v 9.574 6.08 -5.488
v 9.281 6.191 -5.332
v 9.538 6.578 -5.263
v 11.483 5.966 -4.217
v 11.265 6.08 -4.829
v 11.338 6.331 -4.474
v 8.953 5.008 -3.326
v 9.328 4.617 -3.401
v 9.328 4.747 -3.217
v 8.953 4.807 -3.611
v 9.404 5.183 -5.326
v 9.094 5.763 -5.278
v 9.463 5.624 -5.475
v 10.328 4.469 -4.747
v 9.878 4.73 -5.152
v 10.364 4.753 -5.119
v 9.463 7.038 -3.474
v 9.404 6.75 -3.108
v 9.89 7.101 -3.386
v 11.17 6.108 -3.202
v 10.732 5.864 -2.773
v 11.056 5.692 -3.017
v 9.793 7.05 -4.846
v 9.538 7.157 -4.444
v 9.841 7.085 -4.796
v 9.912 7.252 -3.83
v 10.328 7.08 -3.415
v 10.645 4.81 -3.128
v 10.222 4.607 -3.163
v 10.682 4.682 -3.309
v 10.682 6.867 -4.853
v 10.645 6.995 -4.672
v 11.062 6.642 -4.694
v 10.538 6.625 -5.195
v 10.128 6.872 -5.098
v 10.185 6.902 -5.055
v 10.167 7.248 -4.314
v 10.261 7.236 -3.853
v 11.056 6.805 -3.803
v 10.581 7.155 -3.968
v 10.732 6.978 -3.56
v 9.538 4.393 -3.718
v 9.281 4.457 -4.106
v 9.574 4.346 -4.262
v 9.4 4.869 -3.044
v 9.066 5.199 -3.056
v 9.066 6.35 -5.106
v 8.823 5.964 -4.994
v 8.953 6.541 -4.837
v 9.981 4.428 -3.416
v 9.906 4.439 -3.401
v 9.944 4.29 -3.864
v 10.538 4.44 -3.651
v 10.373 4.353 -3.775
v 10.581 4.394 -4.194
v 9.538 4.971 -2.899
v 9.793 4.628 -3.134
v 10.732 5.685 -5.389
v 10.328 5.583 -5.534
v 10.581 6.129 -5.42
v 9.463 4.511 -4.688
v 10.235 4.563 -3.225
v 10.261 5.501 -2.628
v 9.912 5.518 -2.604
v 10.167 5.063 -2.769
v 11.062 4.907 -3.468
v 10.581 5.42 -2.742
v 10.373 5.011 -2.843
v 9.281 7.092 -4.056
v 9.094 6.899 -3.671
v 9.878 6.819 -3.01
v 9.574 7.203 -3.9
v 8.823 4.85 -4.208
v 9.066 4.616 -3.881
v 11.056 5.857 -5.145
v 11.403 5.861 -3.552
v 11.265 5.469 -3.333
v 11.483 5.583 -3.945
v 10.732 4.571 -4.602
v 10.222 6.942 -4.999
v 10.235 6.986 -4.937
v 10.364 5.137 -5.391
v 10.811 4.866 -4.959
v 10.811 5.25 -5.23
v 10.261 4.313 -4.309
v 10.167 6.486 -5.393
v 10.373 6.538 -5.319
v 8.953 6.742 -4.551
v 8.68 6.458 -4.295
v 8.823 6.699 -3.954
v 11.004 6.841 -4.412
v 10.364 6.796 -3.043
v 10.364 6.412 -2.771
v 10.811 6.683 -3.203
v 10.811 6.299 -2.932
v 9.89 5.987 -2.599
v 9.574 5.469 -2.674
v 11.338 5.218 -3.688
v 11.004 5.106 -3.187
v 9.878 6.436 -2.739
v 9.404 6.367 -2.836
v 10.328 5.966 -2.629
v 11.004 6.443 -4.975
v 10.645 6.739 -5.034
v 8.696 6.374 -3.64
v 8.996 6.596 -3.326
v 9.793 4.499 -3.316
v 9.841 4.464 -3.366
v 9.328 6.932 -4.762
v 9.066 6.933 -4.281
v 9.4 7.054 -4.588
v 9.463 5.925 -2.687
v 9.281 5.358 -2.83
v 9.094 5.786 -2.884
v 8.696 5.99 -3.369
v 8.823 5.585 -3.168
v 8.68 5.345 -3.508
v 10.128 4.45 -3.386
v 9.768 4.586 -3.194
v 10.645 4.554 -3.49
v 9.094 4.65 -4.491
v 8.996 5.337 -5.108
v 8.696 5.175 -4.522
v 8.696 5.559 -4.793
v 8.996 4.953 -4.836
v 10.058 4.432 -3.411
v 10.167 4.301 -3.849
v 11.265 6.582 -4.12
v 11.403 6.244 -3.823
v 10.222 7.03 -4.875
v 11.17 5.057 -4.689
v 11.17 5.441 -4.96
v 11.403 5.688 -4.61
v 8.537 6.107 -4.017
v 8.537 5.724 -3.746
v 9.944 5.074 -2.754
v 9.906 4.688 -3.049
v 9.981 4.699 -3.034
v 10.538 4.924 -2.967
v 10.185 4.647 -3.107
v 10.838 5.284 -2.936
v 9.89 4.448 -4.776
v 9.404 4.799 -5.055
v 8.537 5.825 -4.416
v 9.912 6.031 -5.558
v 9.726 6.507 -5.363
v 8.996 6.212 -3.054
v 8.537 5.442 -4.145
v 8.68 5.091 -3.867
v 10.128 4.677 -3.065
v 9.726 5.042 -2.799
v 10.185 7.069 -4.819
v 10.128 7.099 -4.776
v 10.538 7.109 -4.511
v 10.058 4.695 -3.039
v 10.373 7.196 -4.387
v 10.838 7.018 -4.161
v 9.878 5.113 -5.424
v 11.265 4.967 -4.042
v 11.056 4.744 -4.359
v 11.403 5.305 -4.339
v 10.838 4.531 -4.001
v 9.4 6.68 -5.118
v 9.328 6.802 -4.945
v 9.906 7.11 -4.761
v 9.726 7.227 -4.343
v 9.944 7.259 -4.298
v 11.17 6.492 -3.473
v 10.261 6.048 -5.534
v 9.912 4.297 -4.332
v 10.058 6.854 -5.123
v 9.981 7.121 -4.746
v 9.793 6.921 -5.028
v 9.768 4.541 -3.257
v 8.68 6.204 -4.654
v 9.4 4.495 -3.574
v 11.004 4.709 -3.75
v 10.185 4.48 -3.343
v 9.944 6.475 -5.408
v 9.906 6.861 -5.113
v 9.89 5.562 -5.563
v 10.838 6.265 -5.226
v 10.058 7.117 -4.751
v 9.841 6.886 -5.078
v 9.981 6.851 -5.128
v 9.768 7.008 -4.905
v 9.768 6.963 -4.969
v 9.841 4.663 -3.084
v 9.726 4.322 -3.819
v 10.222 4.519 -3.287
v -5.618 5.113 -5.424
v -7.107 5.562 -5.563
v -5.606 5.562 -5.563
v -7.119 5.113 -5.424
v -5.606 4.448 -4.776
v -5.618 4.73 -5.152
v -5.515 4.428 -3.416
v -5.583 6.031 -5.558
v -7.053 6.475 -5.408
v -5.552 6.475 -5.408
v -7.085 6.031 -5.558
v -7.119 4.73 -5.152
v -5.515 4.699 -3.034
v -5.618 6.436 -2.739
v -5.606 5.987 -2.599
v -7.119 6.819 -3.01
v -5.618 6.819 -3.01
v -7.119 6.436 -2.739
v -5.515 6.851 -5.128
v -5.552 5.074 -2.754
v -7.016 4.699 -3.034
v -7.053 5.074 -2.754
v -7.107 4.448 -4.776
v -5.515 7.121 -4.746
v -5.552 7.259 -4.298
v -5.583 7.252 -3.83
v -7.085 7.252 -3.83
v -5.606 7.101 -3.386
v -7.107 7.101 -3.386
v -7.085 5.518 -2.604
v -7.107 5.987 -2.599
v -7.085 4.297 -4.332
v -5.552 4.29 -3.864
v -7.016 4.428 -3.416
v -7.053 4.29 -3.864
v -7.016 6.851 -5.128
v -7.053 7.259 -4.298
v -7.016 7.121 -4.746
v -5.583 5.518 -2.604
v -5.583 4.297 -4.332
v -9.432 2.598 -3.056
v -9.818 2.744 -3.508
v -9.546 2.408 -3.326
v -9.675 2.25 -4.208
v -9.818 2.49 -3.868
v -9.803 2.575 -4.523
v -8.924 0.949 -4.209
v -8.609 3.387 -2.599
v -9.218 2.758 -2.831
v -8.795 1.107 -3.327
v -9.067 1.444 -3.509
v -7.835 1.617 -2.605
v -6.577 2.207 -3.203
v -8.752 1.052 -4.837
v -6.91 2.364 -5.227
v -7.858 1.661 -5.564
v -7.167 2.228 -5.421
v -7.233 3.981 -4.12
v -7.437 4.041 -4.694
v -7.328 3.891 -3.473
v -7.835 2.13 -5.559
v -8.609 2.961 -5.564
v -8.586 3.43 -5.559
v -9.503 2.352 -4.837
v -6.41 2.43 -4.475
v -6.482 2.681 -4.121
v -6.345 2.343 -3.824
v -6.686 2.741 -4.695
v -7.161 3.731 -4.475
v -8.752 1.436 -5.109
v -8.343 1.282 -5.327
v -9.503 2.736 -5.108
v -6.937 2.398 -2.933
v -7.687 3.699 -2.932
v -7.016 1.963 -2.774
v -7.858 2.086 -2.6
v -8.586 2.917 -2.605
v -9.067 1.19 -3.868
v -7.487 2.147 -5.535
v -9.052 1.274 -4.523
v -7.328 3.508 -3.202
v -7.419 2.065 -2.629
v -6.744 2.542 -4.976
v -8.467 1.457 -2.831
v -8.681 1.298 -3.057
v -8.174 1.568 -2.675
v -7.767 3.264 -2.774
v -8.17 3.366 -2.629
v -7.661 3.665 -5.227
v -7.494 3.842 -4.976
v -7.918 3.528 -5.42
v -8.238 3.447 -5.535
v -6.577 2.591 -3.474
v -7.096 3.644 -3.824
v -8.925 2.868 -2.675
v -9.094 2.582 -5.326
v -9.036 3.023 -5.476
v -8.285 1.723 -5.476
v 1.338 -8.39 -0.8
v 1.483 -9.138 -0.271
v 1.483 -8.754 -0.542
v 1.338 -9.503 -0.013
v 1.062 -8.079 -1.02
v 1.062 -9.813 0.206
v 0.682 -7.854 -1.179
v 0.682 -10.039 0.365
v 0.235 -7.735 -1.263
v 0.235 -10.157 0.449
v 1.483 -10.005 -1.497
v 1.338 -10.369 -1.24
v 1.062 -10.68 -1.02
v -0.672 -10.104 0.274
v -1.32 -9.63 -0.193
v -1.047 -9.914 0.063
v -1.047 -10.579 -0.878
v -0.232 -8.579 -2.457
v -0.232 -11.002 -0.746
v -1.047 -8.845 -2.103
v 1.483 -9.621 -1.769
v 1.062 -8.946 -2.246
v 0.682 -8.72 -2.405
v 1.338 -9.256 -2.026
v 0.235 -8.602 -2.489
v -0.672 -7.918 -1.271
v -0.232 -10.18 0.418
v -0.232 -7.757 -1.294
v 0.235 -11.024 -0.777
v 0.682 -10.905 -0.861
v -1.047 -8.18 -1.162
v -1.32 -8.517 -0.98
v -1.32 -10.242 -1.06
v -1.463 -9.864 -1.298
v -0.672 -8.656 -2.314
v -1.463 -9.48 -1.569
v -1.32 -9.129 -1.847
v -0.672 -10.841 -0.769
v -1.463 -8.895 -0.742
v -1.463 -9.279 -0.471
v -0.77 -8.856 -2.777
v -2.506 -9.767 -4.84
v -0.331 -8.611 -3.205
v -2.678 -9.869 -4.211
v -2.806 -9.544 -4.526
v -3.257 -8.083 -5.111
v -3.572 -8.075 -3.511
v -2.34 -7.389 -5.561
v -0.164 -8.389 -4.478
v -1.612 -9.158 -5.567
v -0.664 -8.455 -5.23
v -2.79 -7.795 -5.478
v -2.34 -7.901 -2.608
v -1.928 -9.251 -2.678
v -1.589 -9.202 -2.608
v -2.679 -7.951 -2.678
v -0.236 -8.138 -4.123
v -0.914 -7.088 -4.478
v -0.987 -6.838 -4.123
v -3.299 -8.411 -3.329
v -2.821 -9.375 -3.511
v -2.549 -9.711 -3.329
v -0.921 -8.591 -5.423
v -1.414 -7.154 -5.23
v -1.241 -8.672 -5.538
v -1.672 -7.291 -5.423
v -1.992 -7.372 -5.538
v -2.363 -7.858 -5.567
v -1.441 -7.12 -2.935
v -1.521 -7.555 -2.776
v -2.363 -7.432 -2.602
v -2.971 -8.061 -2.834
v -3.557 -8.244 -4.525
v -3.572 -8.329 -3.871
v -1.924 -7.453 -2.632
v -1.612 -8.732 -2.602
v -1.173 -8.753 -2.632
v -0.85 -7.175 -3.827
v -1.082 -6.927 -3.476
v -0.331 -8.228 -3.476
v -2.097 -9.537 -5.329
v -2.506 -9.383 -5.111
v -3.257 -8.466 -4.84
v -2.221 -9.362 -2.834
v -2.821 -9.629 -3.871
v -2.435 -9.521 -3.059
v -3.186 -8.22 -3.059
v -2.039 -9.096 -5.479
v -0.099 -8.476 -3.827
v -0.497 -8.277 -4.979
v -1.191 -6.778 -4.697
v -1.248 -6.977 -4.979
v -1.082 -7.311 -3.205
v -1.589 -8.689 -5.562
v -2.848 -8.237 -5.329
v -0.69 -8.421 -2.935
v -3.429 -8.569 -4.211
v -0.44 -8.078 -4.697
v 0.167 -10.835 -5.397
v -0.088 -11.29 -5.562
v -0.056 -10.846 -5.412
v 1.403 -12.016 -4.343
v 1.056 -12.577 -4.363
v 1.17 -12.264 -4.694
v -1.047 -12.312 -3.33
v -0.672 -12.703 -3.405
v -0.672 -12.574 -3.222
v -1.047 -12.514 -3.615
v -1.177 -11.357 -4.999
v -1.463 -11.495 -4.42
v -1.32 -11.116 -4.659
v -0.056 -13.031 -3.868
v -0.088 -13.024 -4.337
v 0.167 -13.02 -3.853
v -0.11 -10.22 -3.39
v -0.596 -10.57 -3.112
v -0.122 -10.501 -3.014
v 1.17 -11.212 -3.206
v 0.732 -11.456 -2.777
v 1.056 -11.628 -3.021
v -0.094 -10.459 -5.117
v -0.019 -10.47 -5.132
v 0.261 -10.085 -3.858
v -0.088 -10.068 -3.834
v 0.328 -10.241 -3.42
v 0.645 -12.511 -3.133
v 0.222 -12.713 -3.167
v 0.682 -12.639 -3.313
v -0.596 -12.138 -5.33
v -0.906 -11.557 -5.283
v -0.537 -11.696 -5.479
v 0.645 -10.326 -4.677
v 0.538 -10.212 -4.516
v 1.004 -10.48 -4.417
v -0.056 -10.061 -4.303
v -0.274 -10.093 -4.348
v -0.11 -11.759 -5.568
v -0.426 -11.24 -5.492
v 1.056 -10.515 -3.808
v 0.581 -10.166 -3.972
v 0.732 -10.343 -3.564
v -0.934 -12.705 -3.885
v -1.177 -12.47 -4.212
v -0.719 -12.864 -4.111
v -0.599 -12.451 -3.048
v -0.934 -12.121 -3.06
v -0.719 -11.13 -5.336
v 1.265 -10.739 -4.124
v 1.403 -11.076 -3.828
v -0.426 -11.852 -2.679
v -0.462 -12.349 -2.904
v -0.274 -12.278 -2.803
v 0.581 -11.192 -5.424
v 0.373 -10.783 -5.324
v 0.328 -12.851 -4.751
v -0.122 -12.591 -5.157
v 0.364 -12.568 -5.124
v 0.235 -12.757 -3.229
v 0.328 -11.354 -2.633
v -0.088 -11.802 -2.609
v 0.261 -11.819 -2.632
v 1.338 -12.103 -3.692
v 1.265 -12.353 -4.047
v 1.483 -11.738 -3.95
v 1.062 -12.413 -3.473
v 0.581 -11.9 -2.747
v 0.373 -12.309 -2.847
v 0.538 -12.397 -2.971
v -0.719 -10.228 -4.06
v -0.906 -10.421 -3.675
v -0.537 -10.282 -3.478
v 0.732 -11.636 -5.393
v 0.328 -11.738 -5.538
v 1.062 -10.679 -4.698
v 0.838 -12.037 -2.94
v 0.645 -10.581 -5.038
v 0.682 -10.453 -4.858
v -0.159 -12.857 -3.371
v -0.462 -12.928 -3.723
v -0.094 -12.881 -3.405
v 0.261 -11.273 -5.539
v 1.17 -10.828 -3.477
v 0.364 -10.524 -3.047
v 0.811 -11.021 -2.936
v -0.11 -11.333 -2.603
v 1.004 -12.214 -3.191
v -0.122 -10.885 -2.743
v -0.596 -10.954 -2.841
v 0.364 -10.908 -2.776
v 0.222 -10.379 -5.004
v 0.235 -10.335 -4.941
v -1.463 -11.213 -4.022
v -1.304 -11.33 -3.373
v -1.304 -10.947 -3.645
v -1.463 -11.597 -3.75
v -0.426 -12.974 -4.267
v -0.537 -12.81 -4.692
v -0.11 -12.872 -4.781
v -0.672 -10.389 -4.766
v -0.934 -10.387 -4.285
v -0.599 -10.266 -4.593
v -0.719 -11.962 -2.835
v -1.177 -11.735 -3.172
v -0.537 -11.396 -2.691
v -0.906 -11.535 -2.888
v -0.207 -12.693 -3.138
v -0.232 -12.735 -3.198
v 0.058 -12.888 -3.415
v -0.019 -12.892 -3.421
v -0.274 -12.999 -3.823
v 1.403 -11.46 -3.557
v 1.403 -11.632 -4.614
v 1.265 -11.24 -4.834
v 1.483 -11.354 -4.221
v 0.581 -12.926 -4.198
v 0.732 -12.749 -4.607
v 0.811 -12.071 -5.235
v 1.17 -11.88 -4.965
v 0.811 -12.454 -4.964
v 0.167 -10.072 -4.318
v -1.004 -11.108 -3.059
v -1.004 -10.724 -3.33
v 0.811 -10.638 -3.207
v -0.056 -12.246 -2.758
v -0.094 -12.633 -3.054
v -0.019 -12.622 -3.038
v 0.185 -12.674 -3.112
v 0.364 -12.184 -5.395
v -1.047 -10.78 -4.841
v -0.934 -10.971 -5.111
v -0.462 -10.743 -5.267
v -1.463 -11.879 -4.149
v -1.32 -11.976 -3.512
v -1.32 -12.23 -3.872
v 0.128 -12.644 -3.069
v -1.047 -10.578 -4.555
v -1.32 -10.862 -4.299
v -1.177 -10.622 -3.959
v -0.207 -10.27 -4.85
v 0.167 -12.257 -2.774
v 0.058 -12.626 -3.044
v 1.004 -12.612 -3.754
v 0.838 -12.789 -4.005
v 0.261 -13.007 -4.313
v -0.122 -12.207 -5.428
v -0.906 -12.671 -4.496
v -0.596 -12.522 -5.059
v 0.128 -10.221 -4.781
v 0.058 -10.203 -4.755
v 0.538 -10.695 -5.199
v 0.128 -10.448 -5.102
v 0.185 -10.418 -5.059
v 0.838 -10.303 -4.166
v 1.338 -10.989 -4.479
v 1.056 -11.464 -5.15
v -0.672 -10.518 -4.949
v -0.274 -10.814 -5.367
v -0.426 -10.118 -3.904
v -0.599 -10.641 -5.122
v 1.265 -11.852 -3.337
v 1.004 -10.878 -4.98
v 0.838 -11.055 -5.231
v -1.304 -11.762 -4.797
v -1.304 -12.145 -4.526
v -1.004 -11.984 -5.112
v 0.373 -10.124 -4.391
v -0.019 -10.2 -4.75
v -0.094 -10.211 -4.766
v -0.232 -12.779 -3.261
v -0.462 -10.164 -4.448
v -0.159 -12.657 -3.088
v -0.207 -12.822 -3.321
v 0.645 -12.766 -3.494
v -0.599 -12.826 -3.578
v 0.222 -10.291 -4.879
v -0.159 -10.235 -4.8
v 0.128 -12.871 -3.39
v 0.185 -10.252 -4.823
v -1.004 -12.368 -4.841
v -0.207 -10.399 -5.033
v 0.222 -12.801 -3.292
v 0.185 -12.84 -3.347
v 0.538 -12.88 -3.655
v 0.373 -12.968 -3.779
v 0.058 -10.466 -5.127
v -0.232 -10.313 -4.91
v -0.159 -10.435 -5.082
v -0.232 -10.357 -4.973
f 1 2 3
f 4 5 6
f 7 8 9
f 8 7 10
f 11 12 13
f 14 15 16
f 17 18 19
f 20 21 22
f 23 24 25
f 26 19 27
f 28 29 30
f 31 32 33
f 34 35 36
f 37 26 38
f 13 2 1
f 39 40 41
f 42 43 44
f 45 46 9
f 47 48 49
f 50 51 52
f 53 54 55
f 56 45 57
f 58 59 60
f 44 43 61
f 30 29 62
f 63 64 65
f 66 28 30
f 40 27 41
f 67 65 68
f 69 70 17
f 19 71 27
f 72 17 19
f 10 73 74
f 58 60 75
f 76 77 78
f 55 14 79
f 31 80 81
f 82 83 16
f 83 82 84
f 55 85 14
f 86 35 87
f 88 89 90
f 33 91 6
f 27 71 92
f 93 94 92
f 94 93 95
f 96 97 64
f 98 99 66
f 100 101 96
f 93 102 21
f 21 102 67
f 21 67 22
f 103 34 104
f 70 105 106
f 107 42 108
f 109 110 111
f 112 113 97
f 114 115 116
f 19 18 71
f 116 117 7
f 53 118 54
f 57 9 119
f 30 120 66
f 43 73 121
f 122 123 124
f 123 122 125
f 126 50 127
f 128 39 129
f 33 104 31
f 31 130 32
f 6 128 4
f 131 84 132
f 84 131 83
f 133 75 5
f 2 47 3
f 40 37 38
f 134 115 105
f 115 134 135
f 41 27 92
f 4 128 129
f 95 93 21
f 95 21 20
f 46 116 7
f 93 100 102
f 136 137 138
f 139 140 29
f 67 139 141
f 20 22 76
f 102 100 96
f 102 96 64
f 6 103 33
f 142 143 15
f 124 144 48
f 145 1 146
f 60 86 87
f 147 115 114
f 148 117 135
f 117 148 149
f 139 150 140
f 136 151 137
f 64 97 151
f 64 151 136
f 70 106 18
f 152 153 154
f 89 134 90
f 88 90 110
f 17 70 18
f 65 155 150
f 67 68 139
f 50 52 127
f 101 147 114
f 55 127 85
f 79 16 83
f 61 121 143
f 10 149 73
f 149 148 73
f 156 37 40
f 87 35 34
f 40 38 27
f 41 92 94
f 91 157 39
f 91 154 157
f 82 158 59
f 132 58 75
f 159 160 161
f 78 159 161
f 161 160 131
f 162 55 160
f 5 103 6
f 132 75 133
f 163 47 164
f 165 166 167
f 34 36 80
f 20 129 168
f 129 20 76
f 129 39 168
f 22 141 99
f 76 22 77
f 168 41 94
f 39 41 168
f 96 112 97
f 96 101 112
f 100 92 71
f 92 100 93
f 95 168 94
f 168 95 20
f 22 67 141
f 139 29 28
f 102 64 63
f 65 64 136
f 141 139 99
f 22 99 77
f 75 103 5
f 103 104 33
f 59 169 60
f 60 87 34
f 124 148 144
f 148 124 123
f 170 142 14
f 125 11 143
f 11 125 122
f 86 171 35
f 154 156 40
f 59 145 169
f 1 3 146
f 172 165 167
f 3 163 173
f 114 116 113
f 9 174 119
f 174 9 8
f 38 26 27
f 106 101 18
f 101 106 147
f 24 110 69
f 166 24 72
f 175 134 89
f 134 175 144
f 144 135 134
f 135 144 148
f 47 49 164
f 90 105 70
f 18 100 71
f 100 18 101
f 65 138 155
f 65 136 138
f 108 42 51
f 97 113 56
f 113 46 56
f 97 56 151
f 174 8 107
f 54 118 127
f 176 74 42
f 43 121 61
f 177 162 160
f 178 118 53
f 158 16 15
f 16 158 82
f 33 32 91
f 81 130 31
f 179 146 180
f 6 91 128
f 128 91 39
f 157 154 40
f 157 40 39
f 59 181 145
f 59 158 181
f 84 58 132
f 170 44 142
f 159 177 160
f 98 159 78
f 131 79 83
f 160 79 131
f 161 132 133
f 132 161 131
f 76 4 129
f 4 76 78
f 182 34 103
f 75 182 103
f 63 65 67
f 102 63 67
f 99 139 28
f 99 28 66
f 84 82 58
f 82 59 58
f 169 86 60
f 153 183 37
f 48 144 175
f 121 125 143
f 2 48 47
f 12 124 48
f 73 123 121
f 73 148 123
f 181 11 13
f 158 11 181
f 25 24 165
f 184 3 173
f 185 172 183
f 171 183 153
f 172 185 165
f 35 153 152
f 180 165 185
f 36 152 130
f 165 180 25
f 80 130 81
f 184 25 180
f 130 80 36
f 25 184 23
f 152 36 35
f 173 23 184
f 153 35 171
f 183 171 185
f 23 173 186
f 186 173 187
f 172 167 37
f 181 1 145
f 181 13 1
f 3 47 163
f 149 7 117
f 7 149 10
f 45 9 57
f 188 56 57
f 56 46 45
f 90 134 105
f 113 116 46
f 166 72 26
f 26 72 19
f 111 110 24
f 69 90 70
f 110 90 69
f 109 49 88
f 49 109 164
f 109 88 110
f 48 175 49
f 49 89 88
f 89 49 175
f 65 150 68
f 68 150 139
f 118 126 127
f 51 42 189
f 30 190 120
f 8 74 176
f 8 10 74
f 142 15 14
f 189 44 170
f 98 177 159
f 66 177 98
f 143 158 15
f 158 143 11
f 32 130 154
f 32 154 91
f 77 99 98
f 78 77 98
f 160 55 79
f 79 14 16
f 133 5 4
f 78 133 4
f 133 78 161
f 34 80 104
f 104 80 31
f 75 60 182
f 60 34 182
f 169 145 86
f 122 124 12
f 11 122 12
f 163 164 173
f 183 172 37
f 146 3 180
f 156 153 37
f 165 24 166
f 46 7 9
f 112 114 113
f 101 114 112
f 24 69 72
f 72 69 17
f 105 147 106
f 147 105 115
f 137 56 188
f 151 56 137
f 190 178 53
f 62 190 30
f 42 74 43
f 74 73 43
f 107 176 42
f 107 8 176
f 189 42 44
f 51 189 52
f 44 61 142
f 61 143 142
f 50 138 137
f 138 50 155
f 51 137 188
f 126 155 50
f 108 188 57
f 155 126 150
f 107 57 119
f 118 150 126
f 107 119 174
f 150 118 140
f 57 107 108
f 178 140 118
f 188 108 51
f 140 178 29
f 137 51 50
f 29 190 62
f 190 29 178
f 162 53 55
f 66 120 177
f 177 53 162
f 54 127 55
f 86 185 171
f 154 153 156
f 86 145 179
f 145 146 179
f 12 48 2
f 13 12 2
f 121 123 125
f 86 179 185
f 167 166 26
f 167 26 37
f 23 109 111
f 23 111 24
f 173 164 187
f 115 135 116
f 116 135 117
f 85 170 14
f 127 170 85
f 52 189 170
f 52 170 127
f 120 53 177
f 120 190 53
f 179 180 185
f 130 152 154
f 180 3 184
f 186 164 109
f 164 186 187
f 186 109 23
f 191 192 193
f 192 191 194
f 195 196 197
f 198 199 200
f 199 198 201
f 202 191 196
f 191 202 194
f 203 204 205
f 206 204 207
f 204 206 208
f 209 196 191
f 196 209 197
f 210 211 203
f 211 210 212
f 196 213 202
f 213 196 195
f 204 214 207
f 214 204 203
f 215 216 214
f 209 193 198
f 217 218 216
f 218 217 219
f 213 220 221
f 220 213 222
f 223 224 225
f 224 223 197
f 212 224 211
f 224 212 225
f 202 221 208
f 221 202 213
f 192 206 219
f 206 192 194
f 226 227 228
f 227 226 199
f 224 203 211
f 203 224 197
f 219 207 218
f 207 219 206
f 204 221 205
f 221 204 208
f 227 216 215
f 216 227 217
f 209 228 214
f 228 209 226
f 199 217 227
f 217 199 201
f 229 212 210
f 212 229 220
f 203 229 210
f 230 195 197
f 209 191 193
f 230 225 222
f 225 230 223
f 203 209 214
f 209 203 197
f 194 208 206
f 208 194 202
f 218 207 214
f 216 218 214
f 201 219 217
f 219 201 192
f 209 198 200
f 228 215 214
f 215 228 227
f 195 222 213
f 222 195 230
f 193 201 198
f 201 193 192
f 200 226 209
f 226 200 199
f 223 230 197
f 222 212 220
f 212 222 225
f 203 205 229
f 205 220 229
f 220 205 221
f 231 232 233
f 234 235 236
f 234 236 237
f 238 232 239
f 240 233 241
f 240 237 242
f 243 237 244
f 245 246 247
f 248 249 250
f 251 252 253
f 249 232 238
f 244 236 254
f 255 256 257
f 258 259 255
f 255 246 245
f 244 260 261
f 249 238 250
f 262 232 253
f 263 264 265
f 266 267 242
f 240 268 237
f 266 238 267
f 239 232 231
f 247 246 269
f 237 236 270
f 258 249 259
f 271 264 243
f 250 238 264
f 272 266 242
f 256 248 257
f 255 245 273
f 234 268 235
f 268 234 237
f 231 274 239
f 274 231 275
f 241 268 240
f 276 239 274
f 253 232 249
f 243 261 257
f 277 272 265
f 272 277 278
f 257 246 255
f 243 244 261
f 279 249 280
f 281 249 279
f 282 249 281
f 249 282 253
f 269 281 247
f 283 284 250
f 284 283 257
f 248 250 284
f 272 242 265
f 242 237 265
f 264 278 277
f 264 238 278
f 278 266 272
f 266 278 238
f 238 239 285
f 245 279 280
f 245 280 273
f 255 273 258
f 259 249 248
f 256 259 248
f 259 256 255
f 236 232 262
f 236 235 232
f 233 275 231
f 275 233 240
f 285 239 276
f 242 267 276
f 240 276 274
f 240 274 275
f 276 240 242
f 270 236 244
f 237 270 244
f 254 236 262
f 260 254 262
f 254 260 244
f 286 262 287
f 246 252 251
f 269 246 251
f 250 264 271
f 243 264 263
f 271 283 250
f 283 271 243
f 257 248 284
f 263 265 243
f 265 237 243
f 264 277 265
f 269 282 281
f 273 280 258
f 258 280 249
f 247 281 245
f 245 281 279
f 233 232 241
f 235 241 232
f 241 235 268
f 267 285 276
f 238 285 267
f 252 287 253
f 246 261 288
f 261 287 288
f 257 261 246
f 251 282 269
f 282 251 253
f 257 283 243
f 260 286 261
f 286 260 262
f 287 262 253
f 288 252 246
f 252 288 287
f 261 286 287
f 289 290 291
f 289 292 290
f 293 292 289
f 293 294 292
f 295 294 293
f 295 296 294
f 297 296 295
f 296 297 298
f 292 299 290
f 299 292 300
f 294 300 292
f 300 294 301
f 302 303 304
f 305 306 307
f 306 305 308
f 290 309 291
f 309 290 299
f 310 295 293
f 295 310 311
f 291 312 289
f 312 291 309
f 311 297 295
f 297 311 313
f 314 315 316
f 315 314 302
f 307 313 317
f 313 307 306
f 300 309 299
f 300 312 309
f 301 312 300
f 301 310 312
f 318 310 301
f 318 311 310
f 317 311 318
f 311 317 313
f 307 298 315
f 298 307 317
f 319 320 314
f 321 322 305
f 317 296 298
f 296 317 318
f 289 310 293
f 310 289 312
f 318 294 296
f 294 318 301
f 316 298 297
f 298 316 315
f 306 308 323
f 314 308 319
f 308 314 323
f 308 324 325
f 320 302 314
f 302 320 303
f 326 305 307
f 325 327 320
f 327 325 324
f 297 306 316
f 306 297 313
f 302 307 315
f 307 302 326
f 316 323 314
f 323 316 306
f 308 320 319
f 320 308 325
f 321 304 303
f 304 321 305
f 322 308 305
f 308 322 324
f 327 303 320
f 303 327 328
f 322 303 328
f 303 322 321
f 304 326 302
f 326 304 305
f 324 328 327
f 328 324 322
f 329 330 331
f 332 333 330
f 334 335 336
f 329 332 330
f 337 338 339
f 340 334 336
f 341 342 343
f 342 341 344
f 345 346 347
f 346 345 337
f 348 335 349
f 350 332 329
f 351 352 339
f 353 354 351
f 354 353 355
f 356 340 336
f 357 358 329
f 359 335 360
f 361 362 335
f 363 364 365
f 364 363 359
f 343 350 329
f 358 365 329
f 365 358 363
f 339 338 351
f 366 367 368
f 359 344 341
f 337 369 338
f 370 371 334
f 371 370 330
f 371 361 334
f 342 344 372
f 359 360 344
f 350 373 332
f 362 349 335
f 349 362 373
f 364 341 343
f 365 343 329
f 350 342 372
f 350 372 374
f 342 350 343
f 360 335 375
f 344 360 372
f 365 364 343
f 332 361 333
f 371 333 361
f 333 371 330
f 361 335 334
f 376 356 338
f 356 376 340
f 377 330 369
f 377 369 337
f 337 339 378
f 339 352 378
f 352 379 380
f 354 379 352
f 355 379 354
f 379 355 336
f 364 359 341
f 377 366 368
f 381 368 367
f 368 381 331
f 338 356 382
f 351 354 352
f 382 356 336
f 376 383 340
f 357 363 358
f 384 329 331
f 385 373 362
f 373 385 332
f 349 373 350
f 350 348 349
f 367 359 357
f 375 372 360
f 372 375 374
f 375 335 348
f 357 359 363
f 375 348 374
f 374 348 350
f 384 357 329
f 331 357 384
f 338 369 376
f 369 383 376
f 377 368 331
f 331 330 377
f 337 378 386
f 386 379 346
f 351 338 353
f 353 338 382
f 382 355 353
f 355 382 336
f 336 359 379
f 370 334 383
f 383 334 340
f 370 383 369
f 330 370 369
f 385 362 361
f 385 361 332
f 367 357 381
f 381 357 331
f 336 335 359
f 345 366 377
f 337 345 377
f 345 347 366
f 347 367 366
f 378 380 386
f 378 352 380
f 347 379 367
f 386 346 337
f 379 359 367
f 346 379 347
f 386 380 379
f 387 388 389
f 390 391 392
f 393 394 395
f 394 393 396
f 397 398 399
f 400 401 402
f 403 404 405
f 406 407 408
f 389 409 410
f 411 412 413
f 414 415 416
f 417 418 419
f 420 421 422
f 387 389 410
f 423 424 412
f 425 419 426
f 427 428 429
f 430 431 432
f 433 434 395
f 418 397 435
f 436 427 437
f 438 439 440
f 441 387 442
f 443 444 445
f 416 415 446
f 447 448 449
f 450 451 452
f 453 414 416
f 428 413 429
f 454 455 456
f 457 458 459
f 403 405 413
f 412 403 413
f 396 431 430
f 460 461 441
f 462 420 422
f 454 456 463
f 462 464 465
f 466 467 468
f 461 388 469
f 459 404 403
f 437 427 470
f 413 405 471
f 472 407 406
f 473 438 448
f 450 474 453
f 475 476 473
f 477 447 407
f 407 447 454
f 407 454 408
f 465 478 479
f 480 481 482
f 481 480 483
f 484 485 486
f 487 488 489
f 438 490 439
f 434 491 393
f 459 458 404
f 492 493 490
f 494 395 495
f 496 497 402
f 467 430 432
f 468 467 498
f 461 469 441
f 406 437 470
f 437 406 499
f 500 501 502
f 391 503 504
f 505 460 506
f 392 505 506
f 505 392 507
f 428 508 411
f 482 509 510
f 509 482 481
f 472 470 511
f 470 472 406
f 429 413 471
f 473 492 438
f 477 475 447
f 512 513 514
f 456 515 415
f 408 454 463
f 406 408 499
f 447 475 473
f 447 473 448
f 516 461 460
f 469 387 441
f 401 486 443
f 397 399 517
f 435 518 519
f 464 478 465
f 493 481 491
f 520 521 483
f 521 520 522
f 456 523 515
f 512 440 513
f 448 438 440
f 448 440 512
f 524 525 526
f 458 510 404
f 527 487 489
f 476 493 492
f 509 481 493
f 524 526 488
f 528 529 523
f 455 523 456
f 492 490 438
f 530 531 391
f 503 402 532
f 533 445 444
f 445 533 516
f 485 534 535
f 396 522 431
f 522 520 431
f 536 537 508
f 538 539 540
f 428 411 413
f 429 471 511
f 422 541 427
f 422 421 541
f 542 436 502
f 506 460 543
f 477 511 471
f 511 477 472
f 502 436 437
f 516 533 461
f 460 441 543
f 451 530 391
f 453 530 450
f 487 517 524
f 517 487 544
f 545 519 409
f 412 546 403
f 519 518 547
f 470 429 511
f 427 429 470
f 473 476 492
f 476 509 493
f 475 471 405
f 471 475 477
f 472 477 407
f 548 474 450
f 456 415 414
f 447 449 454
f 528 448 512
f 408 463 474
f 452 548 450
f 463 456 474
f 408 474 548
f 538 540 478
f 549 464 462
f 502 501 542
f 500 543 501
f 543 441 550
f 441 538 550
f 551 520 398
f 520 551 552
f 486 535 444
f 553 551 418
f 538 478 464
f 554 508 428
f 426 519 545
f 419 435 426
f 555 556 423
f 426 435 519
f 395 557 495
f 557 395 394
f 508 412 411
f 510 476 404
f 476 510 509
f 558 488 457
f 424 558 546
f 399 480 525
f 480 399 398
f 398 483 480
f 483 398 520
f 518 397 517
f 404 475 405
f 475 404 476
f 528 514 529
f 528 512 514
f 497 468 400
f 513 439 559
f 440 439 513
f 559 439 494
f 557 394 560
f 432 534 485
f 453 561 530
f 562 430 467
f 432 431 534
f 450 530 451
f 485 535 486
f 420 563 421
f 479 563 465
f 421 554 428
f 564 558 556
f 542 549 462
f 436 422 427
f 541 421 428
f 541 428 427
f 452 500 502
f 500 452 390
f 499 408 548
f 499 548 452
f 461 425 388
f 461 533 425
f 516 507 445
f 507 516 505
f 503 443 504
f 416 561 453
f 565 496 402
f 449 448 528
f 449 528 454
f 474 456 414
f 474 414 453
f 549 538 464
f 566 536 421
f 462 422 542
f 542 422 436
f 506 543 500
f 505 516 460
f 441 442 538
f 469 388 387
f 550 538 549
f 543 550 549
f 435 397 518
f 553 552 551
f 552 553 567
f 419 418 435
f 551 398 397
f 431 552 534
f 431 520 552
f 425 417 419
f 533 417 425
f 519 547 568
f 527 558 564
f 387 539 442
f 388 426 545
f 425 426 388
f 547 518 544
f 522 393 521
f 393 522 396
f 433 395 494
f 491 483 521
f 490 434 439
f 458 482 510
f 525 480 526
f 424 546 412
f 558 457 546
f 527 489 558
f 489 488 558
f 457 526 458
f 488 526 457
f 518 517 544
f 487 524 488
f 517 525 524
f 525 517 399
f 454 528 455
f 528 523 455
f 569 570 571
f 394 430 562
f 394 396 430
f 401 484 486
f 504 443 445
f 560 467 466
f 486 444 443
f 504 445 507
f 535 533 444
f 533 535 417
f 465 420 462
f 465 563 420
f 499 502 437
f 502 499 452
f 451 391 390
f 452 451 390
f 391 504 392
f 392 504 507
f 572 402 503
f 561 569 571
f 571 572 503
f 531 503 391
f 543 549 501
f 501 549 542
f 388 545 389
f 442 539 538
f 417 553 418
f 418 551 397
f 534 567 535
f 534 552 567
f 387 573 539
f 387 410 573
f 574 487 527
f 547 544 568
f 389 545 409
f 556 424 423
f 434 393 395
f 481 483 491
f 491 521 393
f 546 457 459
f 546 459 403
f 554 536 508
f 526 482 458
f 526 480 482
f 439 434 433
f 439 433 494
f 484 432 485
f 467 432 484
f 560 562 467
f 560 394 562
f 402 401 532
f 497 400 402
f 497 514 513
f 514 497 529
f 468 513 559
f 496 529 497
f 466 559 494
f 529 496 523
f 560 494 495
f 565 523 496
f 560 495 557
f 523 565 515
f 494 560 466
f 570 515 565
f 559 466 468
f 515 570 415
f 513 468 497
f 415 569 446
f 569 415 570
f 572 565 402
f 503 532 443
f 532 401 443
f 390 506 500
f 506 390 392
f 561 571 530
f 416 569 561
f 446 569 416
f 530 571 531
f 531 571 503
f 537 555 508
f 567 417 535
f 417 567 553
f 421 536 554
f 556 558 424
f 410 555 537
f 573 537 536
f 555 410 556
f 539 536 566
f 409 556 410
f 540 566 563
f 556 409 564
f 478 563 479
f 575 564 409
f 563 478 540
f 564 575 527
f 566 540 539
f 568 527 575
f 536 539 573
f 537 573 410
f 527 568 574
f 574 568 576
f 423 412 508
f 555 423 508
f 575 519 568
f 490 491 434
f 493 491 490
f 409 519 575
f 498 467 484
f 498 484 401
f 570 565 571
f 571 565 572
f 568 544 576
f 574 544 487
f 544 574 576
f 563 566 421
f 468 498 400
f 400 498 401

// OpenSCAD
// Generated by SolidPython 0.4.6 on 2020-02-11 13:11:25
$fa = .01;
$fs = 0.05;


rotate(a = [54.7500000000, 0, 0]) {
	color(c = "red") {
		scale(v = [10.0000000000, 10.0000000000, 10.0000000000]) {
			union() {
				translate(v = [1.0000000000, 0.0000000000, -0.7071067812]) {
					sphere(r = 0.1501500000);
				}
				hull() {
					difference() {
						hull() {
							translate(v = [-0.6997000000, 0.0000000000, -0.7071067812]) {
								sphere(r = 0.1501500000);
							}
							translate(v = [-0.5495500000, 0.0000000000, -0.7071067812]) {
								sphere(r = 0.1501500000);
							}
						}
						translate(v = [-0.6997000000, 0.0000000000, -0.7071067812]) {
							sphere(r = 0.1501500000);
						}
						translate(v = [-0.5495500000, 0.0000000000, -0.7071067812]) {
							sphere(r = 0.1501500000);
						}
					}
				}
				hull() {
					difference() {
						hull() {
							translate(v = [-0.8498500000, -0.1501500000, -0.4947626148]) {
								sphere(r = 0.1501500000);
							}
							translate(v = [-0.7747750000, -0.2252250000, -0.3885905316]) {
								sphere(r = 0.1501500000);
							}
						}
						translate(v = [-0.8498500000, -0.1501500000, -0.4947626148]) {
							sphere(r = 0.1501500000);
						}
						translate(v = [-0.7747750000, -0.2252250000, -0.3885905316]) {
							sphere(r = 0.1501500000);
						}
					}
				}
				hull() {
					difference() {
						hull() {
							translate(v = [0.0000000000, -0.6997000000, 0.7071067812]) {
								sphere(r = 0.1501500000);
							}
							translate(v = [0.0000000000, -0.5495500000, 0.7071067812]) {
								sphere(r = 0.1501500000);
							}
						}
						translate(v = [0.0000000000, -0.6997000000, 0.7071067812]) {
							sphere(r = 0.1501500000);
						}
						translate(v = [0.0000000000, -0.5495500000, 0.7071067812]) {
							sphere(r = 0.1501500000);
						}
					}
				}
				hull() {
					difference() {
						hull() {
							translate(v = [-0.1501500000, -0.8498500000, 0.4947626148]) {
								sphere(r = 0.1501500000);
							}
							translate(v = [-0.2252250000, -0.7747750000, 0.3885905316]) {
								sphere(r = 0.1501500000);
							}
						}
						translate(v = [-0.1501500000, -0.8498500000, 0.4947626148]) {
							sphere(r = 0.1501500000);
						}
						translate(v = [-0.2252250000, -0.7747750000, 0.3885905316]) {
							sphere(r = 0.1501500000);
						}
					}
				}
				translate(v = [0.0000000000, -1.0000000000, 0.7071067812]) {
					sphere(r = 0.1501500000);
				}
			}
		}
	}
}
/***********************************************
*********      SolidPython code:      **********
************************************************
 
from typing import Iterable
from os.path import join as path_join

from solid import *
from solid.utils import *


def line(
    a: Tuple[float, float, float],
    b: Tuple[float, float, float],
    r: float = 1.0,
    capped=True,
):
    if capped:
        return hull()(translate(a)(sphere(r=r)), translate(b)(sphere(r=r)))
    else:
        return hull()(
            hull()(translate(a)(sphere(r=r)), translate(b)(sphere(r=r)))
            - translate(a)(sphere(r=r))
            - translate(b)(sphere(r=r))
        )


def mix(p1: Tuple[float, float, float], p2: Tuple[float, float, float], a: float):
    if len(p1) != len(p2):
        raise IndexError()
    return tuple((x * (1 - a)) + (y * a) for x, y in zip(p1, p2))


def pairwise_hull(objs: Iterable[OpenSCADObject]):
    return sum(hull()(a, b) for a, b in zip(objs, objs[1:]))


def generate_part(part, partname, resolution=0.1):
    scad_render_to_file(
        part,
        path_join("generated", f"{partname}.scad"),
        file_header=f"$fa = .01;\n$fs = {resolution};\n",
    )


__all__ = ["line", "mix", "pairwise_hull", "generate_part"]
 
 
************************************************/
